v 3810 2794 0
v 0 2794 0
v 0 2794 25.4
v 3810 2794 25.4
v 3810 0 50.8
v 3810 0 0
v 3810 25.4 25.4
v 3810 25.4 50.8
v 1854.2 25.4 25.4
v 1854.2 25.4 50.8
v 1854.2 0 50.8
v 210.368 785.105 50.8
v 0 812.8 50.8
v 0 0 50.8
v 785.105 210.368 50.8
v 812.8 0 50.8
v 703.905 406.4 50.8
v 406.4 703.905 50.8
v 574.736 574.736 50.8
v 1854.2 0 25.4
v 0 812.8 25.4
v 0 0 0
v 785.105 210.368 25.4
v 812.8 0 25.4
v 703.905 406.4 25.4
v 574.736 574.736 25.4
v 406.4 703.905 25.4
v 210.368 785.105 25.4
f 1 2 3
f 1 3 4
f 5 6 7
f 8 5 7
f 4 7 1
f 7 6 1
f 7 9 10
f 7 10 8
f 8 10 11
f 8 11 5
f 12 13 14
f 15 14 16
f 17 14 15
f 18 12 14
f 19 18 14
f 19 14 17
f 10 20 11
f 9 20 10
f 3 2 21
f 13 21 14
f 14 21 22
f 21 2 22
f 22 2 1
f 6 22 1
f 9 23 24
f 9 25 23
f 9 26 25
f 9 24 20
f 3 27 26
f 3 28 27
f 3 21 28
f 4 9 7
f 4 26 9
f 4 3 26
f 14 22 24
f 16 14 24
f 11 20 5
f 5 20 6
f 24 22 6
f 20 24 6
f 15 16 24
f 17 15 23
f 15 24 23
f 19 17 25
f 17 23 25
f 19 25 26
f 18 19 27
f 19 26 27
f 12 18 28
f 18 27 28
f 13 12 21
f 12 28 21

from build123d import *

# Parameters (mm, degrees)
F0_W     = 3810
F0_H     = 2794
F1_DEPTH = 25.4
F2_W     = 1955.8
F2_H     = 25.4
F3_DEPTH = 25.4


with BuildPart() as f1:
    # F0 (on Top) → F1 (new body)
    with BuildSketch(Plane.XY):
        with Locations((1905, 1397)):
            Rectangle(F0_W, F0_H)
    extrude(amount=F1_DEPTH)

    # F2 (on face) → F3 (join)
    with BuildSketch(Plane.XY.offset(25.4)):
        with BuildLine():
            Line((0, 0), (812.8, 0))
            ThreePointArc((812.8, 0), (574.736392, 574.736392), (0, 812.8))
            Line((0, 812.8), (0, 0))
        make_face()
        with Locations((2832.1, 12.7)):
            Rectangle(F2_W, F2_H)
    extrude(amount=F3_DEPTH)


solid = f1.part
